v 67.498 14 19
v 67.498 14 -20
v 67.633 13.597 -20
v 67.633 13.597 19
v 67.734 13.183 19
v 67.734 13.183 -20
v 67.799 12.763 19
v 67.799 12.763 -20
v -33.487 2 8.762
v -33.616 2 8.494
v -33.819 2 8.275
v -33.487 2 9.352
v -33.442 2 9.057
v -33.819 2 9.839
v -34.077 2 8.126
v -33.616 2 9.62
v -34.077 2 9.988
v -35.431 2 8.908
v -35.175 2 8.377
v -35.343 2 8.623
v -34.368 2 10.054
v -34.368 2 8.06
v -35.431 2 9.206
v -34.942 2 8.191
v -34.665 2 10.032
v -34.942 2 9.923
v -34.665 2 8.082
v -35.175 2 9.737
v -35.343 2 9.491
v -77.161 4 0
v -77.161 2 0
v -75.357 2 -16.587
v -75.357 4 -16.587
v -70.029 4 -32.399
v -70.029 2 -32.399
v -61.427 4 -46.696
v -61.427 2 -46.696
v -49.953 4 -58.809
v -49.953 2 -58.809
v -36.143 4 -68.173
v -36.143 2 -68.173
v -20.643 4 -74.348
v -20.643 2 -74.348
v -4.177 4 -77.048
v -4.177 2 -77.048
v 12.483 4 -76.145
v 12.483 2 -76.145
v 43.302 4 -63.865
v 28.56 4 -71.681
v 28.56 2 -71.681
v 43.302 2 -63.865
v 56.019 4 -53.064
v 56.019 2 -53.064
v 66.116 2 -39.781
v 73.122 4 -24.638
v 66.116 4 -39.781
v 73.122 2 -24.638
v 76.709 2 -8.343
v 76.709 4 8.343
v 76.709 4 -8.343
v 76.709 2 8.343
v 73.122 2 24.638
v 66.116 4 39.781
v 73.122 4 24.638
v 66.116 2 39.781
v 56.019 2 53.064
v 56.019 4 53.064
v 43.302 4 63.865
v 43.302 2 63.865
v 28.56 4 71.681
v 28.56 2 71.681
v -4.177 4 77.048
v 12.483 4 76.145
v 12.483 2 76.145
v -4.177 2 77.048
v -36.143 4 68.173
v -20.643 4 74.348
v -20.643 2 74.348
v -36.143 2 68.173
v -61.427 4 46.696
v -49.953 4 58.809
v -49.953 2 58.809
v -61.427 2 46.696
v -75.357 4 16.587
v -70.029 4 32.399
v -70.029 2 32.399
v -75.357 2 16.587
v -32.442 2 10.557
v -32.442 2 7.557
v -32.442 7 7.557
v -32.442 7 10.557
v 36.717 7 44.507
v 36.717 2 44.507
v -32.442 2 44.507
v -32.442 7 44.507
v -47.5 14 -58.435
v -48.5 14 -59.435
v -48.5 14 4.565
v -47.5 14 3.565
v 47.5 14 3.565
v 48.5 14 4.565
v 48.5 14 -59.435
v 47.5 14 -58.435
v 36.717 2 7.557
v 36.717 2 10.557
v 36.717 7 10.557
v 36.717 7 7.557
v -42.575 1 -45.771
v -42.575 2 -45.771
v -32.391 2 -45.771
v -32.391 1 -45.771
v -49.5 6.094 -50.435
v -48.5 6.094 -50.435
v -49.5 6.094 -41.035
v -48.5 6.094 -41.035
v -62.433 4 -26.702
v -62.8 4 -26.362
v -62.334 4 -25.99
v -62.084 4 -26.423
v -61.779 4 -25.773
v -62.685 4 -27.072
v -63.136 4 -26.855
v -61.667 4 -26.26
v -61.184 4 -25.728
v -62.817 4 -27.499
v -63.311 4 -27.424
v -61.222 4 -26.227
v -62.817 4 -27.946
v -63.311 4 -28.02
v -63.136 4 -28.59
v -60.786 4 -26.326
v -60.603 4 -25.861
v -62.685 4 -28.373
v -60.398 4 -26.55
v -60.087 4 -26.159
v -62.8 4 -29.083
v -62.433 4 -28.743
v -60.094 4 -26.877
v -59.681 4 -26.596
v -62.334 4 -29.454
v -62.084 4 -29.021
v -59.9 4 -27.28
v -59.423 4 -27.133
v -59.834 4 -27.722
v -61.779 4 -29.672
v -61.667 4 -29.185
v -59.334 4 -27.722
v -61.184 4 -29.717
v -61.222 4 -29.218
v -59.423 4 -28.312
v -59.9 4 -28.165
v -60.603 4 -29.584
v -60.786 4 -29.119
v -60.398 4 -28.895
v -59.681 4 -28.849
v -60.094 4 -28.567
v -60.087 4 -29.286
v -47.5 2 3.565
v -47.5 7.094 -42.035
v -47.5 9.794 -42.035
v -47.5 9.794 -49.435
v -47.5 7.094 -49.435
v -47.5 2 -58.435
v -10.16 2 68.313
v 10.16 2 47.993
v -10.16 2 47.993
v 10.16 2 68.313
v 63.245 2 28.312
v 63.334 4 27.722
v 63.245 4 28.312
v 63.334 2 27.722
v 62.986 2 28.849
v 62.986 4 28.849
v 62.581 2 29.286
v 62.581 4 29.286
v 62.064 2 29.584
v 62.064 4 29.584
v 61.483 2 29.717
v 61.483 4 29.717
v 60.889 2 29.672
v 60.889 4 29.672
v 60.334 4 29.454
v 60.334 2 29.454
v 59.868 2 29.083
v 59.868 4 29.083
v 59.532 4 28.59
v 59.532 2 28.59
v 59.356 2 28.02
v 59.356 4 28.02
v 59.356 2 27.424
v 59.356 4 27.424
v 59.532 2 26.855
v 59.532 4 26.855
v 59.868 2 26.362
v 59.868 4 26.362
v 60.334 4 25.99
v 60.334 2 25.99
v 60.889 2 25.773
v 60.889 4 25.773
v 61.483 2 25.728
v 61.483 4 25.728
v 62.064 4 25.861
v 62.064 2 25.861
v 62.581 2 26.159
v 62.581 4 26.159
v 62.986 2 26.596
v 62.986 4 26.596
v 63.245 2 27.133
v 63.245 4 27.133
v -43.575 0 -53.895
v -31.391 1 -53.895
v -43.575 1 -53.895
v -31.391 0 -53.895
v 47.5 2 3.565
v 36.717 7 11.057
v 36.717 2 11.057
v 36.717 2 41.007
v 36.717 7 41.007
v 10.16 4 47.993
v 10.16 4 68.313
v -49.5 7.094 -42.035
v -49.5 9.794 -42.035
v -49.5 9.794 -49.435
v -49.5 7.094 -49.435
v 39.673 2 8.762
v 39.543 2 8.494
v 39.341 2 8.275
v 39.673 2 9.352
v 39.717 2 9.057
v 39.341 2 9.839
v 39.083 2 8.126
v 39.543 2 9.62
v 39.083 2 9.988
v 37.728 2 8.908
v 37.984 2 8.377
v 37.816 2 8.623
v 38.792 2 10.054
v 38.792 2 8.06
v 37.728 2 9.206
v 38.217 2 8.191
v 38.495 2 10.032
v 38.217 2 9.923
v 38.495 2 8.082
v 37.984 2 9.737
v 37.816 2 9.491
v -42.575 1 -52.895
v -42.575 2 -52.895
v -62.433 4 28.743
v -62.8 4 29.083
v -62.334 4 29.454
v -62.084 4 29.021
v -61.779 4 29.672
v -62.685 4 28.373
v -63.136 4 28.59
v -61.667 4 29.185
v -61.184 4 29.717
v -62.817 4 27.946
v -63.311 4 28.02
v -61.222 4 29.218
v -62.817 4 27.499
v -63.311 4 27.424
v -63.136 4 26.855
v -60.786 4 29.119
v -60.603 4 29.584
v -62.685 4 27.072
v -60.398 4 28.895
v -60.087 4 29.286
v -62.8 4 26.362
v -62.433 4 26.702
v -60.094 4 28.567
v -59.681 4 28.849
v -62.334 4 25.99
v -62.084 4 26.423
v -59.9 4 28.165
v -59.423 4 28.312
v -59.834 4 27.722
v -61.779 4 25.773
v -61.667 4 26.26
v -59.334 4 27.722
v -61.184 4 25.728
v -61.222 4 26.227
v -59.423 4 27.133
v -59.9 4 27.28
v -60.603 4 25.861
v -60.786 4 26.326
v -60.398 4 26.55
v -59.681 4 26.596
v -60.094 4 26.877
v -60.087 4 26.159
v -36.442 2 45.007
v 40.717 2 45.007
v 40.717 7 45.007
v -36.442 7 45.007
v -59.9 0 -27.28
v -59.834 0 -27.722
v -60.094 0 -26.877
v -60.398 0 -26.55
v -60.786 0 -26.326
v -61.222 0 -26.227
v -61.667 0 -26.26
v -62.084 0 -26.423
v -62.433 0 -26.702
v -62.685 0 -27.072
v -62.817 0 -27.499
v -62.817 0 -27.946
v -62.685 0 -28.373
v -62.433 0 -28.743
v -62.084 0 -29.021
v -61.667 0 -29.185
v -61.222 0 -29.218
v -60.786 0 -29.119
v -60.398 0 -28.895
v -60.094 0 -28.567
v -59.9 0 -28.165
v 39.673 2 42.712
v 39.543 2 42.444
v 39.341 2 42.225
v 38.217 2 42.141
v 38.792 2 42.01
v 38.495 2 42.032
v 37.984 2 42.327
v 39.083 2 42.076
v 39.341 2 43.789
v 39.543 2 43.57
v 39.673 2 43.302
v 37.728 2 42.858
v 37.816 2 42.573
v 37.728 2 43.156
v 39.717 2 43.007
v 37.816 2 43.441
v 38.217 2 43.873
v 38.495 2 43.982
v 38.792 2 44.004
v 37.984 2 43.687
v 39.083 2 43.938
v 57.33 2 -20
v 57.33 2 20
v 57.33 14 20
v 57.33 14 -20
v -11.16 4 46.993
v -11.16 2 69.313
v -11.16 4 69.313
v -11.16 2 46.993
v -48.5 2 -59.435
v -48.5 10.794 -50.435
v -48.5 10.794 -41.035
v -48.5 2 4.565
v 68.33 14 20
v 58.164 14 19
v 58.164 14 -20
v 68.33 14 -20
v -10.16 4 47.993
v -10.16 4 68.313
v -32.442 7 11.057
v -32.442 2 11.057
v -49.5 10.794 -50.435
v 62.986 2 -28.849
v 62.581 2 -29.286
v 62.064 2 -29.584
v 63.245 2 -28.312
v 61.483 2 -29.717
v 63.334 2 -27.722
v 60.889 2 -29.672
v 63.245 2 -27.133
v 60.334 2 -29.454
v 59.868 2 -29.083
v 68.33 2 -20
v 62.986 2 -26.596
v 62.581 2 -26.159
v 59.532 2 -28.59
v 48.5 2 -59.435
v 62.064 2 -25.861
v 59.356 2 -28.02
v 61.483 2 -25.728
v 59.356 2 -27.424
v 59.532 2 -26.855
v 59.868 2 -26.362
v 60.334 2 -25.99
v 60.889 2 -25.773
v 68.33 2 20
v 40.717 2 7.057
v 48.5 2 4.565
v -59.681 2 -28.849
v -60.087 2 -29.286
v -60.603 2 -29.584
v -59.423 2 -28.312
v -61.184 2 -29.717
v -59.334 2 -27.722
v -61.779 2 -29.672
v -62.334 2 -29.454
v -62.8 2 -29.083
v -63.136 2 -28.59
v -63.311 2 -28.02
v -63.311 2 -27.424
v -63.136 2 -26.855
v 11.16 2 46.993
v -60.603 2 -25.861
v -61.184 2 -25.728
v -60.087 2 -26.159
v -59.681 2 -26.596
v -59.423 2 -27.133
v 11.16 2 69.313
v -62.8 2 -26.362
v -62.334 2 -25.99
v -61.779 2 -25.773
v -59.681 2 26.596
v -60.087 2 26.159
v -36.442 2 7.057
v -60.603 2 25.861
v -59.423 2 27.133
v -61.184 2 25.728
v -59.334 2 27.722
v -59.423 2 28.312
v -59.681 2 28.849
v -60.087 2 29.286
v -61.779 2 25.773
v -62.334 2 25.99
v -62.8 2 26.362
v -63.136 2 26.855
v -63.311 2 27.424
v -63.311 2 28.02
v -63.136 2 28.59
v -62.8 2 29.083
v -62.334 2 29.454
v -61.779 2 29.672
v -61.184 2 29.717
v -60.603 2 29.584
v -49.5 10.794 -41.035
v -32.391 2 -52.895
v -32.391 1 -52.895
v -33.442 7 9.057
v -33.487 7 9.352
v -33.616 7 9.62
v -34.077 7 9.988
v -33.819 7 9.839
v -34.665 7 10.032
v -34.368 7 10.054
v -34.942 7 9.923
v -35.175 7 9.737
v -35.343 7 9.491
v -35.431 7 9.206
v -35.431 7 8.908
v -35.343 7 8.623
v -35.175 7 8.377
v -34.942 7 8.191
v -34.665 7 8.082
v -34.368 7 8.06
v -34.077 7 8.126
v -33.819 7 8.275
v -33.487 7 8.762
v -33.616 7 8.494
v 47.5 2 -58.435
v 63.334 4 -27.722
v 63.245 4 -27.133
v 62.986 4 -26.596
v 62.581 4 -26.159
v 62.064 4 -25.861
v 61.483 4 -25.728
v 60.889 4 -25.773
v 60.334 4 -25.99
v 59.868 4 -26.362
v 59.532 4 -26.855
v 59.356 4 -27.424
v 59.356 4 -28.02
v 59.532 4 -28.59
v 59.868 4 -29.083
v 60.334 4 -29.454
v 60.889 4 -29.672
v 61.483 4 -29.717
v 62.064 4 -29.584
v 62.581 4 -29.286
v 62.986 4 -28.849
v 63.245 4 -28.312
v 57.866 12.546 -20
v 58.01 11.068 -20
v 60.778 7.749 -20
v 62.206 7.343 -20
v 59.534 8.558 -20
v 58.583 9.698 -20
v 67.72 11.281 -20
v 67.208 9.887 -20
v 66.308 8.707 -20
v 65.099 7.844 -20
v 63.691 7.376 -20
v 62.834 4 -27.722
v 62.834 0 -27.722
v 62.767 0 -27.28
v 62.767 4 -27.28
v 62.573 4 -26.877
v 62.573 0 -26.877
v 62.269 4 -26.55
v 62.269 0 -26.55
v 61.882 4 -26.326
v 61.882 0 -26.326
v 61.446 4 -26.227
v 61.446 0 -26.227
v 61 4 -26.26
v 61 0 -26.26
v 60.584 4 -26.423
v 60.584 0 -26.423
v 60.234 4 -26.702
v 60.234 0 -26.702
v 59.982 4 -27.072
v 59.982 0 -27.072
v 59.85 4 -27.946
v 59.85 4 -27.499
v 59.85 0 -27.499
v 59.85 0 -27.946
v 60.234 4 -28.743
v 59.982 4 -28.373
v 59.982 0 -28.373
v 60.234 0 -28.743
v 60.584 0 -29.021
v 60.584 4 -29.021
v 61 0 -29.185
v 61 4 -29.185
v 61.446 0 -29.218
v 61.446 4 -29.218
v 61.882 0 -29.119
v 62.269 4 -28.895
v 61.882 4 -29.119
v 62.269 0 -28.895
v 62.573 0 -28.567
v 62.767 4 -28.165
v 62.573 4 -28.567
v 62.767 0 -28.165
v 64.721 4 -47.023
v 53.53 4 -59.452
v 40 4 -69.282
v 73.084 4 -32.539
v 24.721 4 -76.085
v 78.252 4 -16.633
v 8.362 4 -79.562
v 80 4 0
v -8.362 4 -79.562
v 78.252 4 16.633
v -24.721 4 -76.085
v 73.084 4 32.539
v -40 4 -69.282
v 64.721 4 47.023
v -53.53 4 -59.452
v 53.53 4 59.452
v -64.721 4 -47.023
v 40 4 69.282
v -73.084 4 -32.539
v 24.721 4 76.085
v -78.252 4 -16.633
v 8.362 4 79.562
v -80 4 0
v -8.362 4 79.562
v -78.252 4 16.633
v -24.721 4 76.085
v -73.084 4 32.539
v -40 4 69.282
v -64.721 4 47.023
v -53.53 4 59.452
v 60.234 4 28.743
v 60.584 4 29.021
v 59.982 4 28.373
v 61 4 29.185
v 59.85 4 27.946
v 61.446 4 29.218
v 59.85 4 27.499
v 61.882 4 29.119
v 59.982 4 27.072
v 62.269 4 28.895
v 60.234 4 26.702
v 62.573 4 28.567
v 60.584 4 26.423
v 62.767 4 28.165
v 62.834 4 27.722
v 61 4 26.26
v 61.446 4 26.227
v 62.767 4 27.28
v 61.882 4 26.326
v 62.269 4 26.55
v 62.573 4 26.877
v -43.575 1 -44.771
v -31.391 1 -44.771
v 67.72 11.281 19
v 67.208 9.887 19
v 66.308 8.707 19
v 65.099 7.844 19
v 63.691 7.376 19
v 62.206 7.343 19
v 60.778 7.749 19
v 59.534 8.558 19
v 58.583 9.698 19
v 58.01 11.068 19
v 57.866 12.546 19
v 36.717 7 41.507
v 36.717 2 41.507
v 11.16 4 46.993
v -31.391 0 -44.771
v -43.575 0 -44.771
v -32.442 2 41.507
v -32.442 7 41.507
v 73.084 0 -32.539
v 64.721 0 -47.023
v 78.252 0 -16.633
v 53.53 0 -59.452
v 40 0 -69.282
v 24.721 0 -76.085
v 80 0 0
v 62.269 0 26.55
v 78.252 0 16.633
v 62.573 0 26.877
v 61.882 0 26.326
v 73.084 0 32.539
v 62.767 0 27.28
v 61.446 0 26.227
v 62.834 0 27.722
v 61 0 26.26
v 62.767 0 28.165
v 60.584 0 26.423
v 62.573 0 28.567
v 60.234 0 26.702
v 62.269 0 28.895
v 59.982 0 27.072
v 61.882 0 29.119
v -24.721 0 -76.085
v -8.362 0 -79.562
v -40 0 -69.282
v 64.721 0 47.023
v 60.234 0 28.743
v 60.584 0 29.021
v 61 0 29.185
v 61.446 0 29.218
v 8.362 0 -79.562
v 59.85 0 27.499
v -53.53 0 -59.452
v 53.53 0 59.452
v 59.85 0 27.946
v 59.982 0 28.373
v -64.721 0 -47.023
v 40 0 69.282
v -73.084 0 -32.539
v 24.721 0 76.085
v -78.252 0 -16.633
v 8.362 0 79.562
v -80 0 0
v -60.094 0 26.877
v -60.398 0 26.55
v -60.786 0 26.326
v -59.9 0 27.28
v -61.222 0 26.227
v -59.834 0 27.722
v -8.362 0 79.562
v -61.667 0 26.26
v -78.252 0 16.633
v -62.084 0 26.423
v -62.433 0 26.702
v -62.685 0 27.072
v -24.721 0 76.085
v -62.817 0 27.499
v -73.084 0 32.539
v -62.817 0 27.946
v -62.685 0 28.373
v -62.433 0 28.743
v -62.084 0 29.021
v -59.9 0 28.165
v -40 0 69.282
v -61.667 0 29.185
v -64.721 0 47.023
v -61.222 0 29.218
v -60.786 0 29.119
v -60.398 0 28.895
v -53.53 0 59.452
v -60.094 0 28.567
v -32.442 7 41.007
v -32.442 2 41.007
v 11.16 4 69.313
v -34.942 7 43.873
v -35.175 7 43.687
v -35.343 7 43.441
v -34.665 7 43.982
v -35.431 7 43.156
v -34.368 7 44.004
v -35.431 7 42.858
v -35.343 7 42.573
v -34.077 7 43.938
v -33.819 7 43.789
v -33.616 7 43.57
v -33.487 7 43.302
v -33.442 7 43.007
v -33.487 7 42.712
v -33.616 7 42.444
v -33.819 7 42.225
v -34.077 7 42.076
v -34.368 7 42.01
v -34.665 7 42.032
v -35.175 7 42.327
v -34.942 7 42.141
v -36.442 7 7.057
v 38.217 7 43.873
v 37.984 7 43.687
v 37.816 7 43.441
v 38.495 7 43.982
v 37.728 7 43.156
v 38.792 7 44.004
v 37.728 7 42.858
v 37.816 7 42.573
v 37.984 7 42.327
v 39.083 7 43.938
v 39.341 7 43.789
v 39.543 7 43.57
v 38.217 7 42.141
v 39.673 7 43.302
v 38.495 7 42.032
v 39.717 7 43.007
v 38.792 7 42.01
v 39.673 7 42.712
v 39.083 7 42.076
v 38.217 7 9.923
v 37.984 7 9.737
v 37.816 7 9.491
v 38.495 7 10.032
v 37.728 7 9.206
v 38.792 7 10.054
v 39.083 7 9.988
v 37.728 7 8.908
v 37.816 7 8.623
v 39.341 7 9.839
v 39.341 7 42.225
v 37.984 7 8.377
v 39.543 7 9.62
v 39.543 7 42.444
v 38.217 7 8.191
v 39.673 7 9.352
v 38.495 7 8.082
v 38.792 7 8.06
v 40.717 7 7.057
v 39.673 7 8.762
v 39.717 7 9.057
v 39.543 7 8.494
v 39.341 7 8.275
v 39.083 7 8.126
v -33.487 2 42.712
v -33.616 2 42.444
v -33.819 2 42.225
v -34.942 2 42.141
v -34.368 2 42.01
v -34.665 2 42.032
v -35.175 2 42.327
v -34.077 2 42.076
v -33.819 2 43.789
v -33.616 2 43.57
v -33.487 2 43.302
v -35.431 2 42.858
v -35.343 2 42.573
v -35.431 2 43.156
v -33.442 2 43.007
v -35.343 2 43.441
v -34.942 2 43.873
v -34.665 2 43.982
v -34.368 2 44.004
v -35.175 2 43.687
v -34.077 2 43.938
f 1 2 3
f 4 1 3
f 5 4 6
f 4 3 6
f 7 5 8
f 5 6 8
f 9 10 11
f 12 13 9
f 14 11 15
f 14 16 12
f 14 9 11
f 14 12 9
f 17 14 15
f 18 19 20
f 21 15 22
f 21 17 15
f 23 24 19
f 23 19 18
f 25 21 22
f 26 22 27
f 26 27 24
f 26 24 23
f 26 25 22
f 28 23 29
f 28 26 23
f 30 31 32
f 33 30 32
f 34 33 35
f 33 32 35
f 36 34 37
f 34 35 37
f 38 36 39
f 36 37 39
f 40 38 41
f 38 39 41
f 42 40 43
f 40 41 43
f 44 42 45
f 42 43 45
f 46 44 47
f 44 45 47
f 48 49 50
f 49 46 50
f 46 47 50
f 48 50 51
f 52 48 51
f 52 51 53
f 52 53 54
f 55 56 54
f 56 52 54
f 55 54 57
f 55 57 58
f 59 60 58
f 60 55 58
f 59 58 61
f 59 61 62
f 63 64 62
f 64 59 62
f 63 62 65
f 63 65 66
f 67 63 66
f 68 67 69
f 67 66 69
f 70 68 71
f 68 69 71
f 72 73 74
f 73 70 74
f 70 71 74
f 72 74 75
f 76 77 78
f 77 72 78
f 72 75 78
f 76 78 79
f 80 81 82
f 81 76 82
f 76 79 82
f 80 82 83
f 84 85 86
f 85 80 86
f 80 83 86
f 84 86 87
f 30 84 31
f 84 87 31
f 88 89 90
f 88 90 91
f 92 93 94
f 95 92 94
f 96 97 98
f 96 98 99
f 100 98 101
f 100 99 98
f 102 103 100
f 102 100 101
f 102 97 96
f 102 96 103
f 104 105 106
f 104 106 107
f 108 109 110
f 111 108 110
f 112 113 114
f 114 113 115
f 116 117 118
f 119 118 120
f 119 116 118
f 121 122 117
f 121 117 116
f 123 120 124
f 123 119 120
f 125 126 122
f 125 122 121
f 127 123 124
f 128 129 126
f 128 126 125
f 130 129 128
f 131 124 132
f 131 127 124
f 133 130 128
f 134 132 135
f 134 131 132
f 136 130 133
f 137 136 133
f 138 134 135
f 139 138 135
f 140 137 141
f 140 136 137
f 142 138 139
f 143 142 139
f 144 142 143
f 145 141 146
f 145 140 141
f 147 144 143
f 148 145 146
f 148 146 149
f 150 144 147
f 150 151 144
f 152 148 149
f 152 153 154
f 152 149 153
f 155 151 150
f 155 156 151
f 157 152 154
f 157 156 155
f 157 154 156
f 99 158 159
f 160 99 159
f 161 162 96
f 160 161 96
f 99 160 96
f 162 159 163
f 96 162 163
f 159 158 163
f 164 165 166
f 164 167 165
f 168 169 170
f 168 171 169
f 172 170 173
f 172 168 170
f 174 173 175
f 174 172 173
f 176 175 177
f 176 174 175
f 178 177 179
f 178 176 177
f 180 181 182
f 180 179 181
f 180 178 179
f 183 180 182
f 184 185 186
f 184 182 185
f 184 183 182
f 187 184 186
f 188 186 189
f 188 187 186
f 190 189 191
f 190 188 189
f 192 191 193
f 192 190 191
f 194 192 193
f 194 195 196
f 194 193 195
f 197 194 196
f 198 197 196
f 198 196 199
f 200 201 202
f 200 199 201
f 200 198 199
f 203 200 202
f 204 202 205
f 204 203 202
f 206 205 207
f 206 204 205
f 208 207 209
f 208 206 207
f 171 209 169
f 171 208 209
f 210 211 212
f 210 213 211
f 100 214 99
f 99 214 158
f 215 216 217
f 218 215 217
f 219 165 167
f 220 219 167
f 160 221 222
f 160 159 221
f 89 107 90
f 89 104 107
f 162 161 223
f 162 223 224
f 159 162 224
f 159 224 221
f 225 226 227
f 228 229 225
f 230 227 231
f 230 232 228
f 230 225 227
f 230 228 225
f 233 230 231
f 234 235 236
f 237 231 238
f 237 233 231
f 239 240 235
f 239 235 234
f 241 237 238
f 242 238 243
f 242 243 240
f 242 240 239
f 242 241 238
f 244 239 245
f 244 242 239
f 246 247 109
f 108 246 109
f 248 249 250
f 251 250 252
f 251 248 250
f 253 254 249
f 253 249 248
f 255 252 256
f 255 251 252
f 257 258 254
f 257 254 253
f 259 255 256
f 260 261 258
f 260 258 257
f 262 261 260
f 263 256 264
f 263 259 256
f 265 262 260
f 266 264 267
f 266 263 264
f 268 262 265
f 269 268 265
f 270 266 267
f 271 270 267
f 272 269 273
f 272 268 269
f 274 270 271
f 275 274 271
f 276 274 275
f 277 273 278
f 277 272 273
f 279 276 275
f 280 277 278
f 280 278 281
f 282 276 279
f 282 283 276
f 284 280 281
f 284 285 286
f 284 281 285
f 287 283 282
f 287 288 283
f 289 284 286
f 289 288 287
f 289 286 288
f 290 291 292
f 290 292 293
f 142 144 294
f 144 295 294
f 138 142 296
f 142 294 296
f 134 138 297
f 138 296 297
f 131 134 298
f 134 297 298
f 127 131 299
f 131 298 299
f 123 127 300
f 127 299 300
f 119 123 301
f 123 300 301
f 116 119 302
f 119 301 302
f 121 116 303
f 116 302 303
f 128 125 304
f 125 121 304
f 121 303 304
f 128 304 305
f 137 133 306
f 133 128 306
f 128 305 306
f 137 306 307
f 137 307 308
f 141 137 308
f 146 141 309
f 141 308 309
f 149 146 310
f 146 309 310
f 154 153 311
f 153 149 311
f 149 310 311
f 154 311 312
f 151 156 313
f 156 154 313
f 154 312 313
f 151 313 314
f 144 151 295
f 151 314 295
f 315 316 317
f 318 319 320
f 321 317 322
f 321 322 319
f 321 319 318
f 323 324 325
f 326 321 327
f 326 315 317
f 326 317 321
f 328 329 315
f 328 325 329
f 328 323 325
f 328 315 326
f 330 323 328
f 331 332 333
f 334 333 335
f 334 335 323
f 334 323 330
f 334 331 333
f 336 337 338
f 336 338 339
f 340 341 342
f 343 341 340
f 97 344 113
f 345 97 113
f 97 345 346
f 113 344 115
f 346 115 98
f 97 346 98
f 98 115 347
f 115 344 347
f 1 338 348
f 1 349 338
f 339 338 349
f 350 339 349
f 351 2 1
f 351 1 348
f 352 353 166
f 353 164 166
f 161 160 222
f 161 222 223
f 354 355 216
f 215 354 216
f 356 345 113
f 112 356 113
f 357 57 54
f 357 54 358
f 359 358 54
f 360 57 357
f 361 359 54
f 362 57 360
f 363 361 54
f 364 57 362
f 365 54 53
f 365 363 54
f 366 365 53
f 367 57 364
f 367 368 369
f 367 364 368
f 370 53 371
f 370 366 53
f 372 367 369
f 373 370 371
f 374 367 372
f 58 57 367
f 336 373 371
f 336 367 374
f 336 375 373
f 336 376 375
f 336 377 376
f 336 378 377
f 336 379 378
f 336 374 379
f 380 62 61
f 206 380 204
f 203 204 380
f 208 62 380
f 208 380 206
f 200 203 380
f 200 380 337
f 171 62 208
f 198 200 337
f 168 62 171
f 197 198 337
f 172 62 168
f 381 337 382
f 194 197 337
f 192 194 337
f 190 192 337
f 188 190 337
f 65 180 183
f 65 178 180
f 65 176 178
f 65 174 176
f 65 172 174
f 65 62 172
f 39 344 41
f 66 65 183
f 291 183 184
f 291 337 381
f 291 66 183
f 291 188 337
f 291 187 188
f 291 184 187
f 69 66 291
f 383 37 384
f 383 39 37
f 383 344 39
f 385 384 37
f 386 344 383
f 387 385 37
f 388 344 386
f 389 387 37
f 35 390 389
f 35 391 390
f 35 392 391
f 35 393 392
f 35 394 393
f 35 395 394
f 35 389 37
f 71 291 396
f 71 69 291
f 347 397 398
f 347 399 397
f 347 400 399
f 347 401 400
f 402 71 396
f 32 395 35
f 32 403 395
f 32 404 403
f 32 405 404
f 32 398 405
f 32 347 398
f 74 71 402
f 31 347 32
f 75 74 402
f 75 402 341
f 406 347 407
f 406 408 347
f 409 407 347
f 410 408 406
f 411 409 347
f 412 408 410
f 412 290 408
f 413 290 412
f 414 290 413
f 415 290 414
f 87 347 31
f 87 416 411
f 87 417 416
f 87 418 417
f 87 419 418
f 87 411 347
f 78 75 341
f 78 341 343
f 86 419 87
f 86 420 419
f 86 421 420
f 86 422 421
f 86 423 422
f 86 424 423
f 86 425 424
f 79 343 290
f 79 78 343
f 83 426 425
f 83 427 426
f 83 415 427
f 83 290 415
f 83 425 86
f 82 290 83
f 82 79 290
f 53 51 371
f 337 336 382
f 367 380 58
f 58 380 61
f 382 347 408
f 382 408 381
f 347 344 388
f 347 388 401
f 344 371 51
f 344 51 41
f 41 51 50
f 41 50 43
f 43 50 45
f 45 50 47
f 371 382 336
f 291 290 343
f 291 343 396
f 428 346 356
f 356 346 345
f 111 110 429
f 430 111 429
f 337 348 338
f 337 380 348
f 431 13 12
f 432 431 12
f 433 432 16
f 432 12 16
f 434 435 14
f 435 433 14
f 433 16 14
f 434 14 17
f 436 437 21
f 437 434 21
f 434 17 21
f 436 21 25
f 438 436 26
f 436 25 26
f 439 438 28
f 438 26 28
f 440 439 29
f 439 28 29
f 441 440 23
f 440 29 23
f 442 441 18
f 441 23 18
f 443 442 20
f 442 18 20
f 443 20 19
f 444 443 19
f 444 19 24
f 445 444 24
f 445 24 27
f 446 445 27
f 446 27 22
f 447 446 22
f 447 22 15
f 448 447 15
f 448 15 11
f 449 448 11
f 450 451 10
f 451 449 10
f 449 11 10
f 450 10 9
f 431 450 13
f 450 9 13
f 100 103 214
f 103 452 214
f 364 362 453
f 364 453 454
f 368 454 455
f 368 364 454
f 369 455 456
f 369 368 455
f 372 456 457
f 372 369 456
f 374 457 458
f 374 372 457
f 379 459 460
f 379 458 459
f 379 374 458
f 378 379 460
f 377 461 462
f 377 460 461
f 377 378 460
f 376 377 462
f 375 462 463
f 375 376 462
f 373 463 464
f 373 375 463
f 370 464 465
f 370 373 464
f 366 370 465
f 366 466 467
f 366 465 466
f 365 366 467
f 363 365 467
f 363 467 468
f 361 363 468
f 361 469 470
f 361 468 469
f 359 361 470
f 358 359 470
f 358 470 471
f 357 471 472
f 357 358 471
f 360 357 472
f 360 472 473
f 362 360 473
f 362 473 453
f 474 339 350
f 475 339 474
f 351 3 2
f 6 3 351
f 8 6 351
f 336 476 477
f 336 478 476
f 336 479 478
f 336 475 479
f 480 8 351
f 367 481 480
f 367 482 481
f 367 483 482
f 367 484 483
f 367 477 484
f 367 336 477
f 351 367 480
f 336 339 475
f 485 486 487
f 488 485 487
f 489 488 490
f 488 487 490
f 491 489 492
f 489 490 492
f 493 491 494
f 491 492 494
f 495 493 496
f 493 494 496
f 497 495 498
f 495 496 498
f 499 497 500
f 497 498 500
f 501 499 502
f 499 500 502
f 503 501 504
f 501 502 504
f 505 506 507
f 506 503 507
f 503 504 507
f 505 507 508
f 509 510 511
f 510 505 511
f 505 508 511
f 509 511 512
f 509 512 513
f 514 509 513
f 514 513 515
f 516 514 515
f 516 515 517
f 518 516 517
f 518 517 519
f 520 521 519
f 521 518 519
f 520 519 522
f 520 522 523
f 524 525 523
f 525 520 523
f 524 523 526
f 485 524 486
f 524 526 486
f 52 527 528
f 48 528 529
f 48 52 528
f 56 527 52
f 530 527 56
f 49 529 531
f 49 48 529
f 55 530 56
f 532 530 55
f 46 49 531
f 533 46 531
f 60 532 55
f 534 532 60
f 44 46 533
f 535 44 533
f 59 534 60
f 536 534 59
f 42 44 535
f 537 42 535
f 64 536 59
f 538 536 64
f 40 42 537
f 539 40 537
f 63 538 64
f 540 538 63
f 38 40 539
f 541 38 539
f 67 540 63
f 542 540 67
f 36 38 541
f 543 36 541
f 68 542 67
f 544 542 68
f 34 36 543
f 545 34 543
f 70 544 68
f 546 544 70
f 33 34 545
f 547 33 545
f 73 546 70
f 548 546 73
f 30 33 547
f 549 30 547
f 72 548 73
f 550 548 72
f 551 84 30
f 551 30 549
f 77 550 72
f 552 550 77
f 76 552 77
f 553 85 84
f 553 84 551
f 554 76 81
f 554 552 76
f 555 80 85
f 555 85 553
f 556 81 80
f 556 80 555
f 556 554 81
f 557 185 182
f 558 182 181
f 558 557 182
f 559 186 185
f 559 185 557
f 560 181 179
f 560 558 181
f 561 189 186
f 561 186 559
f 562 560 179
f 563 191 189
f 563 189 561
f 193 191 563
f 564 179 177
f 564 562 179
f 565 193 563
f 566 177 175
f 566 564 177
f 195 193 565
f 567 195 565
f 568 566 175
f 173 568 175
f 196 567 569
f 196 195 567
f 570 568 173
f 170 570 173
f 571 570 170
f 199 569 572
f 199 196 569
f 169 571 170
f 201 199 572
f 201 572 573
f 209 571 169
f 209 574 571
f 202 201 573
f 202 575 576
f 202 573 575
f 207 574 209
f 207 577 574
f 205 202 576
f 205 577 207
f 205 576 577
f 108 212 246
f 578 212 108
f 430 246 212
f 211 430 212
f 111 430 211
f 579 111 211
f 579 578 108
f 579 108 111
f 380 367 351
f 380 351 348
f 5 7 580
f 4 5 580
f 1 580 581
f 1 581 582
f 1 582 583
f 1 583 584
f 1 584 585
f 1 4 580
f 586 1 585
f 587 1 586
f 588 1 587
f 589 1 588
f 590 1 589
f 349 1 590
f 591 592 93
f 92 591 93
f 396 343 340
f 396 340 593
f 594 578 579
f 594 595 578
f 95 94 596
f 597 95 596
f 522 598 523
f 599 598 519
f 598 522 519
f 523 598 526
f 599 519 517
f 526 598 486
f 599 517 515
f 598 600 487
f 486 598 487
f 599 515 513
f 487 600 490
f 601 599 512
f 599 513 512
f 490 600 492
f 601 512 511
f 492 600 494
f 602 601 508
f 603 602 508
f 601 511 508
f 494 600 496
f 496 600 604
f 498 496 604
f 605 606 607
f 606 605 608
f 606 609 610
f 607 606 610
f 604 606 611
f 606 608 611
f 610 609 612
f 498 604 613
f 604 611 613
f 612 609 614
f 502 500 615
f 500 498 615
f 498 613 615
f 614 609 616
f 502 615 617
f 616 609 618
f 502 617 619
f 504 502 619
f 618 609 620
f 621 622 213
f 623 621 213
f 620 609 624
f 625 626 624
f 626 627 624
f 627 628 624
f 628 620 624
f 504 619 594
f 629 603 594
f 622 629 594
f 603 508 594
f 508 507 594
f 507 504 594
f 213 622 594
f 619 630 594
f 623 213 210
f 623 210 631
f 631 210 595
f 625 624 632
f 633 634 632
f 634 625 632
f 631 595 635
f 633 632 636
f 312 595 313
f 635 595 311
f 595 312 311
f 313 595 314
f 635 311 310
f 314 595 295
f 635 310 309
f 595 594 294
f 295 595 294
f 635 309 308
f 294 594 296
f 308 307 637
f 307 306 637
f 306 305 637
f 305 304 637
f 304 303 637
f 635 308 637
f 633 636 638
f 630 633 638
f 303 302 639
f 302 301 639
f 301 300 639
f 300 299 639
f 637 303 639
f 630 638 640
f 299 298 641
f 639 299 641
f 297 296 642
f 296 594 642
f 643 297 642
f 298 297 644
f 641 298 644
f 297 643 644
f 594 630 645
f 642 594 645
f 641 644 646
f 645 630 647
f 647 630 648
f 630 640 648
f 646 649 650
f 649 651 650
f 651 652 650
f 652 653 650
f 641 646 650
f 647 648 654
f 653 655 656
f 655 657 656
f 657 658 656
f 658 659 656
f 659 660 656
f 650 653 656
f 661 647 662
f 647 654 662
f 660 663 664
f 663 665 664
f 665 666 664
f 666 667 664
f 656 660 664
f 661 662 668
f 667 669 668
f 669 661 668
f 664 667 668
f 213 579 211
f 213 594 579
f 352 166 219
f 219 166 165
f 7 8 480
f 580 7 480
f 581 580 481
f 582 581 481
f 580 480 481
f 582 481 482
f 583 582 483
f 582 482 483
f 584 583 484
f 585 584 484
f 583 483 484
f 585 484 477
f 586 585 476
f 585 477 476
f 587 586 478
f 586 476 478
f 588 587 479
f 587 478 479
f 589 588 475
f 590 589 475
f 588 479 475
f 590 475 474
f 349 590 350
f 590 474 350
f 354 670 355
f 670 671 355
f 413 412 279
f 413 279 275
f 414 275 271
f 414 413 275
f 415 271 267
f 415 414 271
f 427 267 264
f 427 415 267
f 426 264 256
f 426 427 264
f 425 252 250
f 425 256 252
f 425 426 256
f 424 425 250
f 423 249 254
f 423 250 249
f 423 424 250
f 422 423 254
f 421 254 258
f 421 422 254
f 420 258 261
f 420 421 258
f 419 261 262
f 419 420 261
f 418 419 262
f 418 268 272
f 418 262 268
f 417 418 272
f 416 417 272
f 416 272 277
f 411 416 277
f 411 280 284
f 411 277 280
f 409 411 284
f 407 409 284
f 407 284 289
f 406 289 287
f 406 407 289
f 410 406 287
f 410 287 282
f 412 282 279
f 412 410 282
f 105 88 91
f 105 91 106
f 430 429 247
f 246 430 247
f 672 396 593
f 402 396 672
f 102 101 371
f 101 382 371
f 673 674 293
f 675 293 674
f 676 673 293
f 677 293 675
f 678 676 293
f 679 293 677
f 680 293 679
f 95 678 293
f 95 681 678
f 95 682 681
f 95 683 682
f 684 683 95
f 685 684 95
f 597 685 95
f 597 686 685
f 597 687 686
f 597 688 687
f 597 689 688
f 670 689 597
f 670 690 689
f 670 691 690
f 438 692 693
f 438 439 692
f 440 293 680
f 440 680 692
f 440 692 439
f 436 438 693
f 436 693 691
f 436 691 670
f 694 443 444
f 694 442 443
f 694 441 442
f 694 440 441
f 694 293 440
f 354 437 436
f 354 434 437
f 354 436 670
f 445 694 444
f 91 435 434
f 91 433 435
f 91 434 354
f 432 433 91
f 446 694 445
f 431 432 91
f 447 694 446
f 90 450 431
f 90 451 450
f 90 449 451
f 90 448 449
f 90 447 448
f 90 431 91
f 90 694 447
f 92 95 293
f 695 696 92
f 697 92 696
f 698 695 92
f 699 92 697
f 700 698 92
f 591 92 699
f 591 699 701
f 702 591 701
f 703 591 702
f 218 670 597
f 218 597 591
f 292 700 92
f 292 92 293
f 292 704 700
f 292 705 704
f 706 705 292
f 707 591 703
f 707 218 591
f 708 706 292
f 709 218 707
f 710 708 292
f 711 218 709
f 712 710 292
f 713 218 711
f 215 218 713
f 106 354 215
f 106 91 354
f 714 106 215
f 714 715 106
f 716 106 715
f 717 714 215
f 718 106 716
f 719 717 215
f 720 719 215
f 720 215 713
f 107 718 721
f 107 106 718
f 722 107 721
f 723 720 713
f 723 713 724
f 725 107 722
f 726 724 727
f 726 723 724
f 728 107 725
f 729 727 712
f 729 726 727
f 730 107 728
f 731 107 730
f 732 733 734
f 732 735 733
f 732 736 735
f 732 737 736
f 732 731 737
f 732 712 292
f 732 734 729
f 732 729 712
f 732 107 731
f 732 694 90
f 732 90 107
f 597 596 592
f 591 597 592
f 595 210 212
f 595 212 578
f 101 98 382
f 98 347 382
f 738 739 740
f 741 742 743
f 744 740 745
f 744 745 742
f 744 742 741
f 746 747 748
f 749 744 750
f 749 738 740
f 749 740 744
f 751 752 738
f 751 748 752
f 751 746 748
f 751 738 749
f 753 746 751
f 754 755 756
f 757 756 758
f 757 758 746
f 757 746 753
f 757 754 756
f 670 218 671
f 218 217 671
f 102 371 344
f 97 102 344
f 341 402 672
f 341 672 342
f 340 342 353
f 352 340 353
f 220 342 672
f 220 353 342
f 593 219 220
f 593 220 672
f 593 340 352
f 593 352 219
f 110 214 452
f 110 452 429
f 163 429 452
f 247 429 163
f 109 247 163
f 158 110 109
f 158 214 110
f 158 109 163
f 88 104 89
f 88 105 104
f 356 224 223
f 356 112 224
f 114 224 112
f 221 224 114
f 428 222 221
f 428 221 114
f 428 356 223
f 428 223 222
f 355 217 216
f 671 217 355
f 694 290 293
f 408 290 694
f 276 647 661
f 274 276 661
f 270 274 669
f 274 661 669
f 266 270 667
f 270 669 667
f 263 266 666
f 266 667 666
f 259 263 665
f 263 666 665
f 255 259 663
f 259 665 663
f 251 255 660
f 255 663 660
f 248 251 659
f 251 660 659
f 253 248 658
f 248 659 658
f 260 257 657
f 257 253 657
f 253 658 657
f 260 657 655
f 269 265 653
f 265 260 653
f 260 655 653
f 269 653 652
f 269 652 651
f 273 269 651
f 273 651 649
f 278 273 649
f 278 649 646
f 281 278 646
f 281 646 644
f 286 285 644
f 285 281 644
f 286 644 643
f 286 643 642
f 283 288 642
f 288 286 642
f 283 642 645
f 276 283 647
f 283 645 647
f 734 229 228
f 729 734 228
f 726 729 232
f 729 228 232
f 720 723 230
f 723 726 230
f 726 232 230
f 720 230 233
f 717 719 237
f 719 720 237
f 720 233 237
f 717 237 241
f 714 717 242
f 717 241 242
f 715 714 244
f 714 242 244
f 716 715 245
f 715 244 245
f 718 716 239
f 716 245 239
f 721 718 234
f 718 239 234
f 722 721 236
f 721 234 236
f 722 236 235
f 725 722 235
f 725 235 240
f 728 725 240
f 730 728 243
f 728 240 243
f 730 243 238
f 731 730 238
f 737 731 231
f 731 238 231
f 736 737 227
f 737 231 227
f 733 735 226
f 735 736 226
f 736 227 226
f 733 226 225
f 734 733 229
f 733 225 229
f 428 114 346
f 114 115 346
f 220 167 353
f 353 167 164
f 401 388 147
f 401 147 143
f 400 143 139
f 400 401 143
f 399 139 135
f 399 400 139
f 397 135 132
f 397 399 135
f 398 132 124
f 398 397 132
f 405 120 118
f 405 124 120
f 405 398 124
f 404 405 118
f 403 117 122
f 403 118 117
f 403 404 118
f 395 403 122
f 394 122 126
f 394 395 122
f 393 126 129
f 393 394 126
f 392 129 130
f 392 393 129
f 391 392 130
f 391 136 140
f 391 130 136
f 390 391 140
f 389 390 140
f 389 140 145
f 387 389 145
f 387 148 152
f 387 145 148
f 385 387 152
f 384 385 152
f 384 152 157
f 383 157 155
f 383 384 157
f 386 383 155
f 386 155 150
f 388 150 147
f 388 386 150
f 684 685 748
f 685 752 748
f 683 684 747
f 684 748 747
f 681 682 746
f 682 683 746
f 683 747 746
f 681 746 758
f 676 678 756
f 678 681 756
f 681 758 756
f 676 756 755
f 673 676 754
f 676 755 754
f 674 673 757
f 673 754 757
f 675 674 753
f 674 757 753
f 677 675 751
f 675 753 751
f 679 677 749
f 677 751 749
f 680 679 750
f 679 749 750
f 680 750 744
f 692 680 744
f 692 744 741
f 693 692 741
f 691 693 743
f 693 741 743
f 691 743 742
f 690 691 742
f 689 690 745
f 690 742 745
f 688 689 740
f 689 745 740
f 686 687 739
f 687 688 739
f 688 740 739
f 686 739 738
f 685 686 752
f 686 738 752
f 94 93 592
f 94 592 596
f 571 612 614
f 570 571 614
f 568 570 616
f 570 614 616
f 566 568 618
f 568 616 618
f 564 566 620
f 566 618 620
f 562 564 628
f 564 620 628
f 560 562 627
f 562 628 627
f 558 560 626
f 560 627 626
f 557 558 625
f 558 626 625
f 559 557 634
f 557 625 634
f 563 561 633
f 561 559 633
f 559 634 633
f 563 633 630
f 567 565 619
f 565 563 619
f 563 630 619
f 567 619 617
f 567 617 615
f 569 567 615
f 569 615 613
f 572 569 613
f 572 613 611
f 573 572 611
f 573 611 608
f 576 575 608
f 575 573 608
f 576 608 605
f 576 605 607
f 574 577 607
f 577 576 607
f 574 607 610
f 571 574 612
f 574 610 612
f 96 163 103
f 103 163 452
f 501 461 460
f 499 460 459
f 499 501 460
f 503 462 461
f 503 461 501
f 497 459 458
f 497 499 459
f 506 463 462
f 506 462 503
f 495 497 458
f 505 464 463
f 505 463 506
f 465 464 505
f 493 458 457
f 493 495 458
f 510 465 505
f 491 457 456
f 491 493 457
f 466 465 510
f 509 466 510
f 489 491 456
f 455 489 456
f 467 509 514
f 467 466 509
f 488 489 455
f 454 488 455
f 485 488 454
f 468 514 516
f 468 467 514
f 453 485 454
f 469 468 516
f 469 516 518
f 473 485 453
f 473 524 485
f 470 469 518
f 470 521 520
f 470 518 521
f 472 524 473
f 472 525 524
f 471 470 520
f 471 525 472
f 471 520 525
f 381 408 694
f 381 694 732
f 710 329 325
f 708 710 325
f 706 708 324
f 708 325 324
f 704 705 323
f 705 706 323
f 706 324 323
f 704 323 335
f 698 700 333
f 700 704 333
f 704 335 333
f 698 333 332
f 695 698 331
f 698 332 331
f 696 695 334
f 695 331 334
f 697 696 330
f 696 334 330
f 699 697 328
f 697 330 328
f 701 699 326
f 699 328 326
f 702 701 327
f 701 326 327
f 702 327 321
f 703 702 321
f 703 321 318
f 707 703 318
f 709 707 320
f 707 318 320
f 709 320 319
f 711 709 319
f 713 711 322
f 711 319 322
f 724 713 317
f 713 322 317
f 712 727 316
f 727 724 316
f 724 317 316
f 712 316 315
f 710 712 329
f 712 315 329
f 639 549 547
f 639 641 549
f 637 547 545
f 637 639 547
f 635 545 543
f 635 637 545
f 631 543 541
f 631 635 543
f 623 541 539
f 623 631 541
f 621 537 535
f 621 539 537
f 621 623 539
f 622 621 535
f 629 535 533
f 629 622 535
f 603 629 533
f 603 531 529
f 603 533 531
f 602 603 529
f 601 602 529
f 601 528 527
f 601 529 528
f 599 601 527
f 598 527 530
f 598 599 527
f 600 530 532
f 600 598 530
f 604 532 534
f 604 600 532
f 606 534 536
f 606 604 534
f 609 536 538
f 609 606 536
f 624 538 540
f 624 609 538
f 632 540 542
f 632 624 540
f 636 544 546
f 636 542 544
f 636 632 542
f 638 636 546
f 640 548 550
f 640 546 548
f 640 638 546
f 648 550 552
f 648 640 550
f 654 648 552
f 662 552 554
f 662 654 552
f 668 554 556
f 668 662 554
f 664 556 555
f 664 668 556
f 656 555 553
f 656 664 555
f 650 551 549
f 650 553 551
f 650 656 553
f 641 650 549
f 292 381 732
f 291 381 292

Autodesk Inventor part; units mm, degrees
ref_plane "YZ Plane" through (0, 0, 0) normal (1, 0, 0) x (0, 1, 0)
ref_plane "XZ Plane" through (0, 0, 0) normal (0, 1, 0) x (-1, 0, 0)
ref_plane "XY Plane" through (0, 0, 0) normal (0, 0, 1) x (1, 0, 0)
sketch "Boceto1" plane through (0, 0, 0) normal (0, 1, 0) x (-1, 0, 0)
  circle A0 centre (0, 0) radius 80
  circle A1 centre (0, 0) radius 77.161
  dimension "d0" = 160
  dimension "d6" = 2.839
extrude "Extrusión3" add sketch "Boceto1" along normal blind 4
extrude "Extrusión4" add sketch "Boceto1" along normal blind 2 contours A1
sketch "Boceto2" plane through (0, 2, 0) normal (0, 1, 0) x (1, 0, 0)
  line L0 (47.5, -3.5651) -> (-47.5, -3.5651)
  line L1 (-47.5, -3.5651) -> (-47.5, 58.4349)
  line L2 (-47.5, 58.4349) -> (47.5, 58.4349)
  line L3 (47.5, 58.4349) -> (47.5, -3.5651)
  line L4 (47.5, -44.1835) -> (-47.5, 44.1835) construction
  line L5 (-47.5, -44.1835) -> (47.5, 44.1835) construction
  line L6 (-48.5, -4.5651) -> (48.5, -4.5651)
  line L7 (48.5, -4.5651) -> (48.5, 59.4349)
  line L8 (48.5, 59.4349) -> (-48.5, 59.4349)
  line L9 (-48.5, 59.4349) -> (-48.5, -4.5651)
  line L10 (-48.5, -9.337) -> (48.5, 54.663) construction
  line L11 (48.5, -45.1835) -> (-48.5, 45.1835) construction
  line L12 (-32.3907, 52.8953) -> (-42.5753, 52.8953)
  line L13 (-42.5753, 52.8953) -> (-42.5753, 45.7711)
  line L14 (-42.5753, 45.7711) -> (-32.3907, 45.7711)
  line L15 (-32.3907, 45.7711) -> (-32.3907, 52.8953)
  point P0 (0, 0)
  dimension "d11" = 95
  dimension "d12" = 62
  dimension "d16" = 1
  dimension "d17" = 1
extrude "Extrusión5" add sketch "Boceto2" along normal blind 12 contours L9 L8 L7 L6
sketch "Boceto4" plane through (-48.5, 2, -59.4349) normal (-1, 0, 0) x (0, 0, 1)
  line L0 (0, 0) -> (0, 12) projected
  line L1 (0, 12) -> (0, 1.9732)
  line L2 (10, 5.0938) -> (17.4, 5.0938)
  line L3 (17.4, 5.0938) -> (17.4, 7.7938)
  line L4 (17.4, 7.7938) -> (10, 7.7938)
  line L5 (10, 7.7938) -> (10, 5.0938)
  line L6 (10, 5.0938) -> (17.4, 7.7938) construction
  line L7 (17.4, 5.0938) -> (10, 7.7938) construction
  line L8 (9, 4.0938) -> (18.4, 4.0938)
  line L9 (18.4, 4.0938) -> (18.4, 8.7938)
  line L10 (18.4, 8.7938) -> (9, 8.7938)
  line L11 (9, 8.7938) -> (9, 4.0938)
  line L12 (9, 4.0938) -> (18.4, 8.7938) construction
  line L13 (18.4, 4.0938) -> (9, 8.7938) construction
  point P0 (59.4349, -2)
  point P1 (13.7, 6.4438)
  dimension "d22" = 7.4
  dimension "d23" = 2.7
  dimension "d24" = 1
  dimension "d25" = 1
extrude "Extrusión6" cut sketch "Boceto4" against normal blind 14 contours L5 L4 L3 L2
extrude "Extrusión7" add sketch "Boceto4" along normal blind 1
sketch "Boceto6" plane through (0, 2, 0) normal (0, 1, 0) x (1, 0, 0)
  line L0 (-32.4424, -11.0569) -> (36.7172, -11.0569)
  line L1 (36.7172, -11.0569) -> (36.7172, -41.0069)
  line L2 (36.7172, -41.0069) -> (-32.4424, -41.0069)
  line L3 (-32.4424, -41.0069) -> (-32.4424, -11.0569)
  line L4 (-36.4424, -7.0569) -> (40.7172, -7.0569)
  line L5 (40.7172, -7.0569) -> (40.7172, -45.0069)
  line L6 (40.7172, -45.0069) -> (-36.4424, -45.0069)
  line L7 (-36.4424, -45.0069) -> (-36.4424, -7.0569)
  line L8 (36.7172, -7.5569) -> (-32.4424, -7.5569)
  line L9 (-32.4424, -7.5569) -> (-32.4424, -10.5569)
  line L10 (-32.4424, -10.5569) -> (36.7172, -10.5569)
  line L11 (36.7172, -10.5569) -> (36.7172, -7.5569)
  line L12 (36.7172, -44.5069) -> (-32.4424, -44.5069)
  line L13 (-32.4424, -44.5069) -> (-32.4424, -41.5069)
  line L14 (-32.4424, -41.5069) -> (36.7172, -41.5069)
  line L15 (36.7172, -41.5069) -> (36.7172, -44.5069)
  circle A0 centre (38.7172, -9.0569) radius 1
  circle A1 centre (38.7172, -43.0069) radius 1
  circle A2 centre (-34.4424, -9.0569) radius 1
  circle A3 centre (-34.4424, -43.0069) radius 1
  point P0 (0, 0)
  dimension "d32" = 4
  dimension "d41" = 3
  dimension "d42" = 0.5
  dimension "d43" = 2
sketch "Boceto7" plane through (0, 2, 0) normal (0, 1, 0) x (1, 0, 0)
  line L0 (-10.16, -47.9931) -> (10.16, -47.9931)
  line L1 (10.16, -47.9931) -> (10.16, -68.3131)
  line L2 (10.16, -68.3131) -> (-10.16, -68.3131)
  line L3 (-10.16, -68.3131) -> (-10.16, -47.9931)
  line L4 (-10.16, -47.9931) -> (10.16, -68.3131) construction
  line L5 (10.16, -47.9931) -> (-10.16, -68.3131) construction
  line L6 (-11.16, -46.9931) -> (11.16, -46.9931)
  line L7 (11.16, -46.9931) -> (11.16, -69.3131)
  line L8 (11.16, -69.3131) -> (-11.16, -69.3131)
  line L9 (-11.16, -69.3131) -> (-11.16, -46.9931)
  line L10 (-11.16, -46.9931) -> (11.16, -69.3131) construction
  line L11 (11.16, -46.9931) -> (-11.16, -69.3131) construction
  point P0 (0, 0)
  point P1 (0, -58.1531)
  dimension "d34" = 20.32
  dimension "d35" = 20.32
  dimension "d36" = 22.32
  dimension "d37" = 22.32
extrude "Extrusión8" add sketch "Boceto7" along normal blind 2
extrude "Extrusión9" add sketch "Boceto6" along normal blind 5
thread "Rosca1" size "M2x0.4" class "6H" standard "ANSI Metric M Profile" full length
thread "Rosca2" size "M2x0.4" class "6H" standard "ANSI Metric M Profile" full length
thread "Rosca3" size "M2x0.4" class "6H" standard "ANSI Metric M Profile" full length
thread "Rosca4" size "M2x0.4" class "6H" standard "ANSI Metric M Profile" full length
extrude "Extrusión10" cut sketch "Boceto2" against normal through all contours L15 L14 L13 L12
sketch "Boceto8" plane through (0, 0, 0) normal (0, -1, 0) x (1, 0, 0)
  line L0 (-42.5753, -52.8953) -> (-32.3907, -52.8953) projected
  line L1 (-32.3907, -52.8953) -> (-32.3907, -45.7711) projected
  line L2 (-31.3907, -53.8953) -> (-43.5753, -53.8953)
  line L3 (-43.5753, -53.8953) -> (-43.5753, -44.7711)
  line L4 (-43.5753, -44.7711) -> (-31.3907, -44.7711)
  line L5 (-31.3907, -44.7711) -> (-31.3907, -53.8953)
  line L6 (-31.3907, -53.8953) -> (-43.5753, -44.7711) construction
  line L7 (-43.5753, -53.8953) -> (-31.3907, -44.7711) construction
  line L8 (-42.5753, -52.8953) -> (-42.5753, -45.7711) projected
  line L9 (-42.5753, -52.8953) -> (-32.3907, -52.8953)
  line L10 (-32.3907, -52.8953) -> (-32.3907, -45.7711)
  line L11 (-32.3907, -45.7711) -> (-42.5753, -45.7711)
  line L12 (-42.5753, -45.7711) -> (-42.5753, -52.8953)
  point P0 (0, 0)
  point P1 (-37.483, -49.3332)
  point P2 (-37.483, -52.8953)
  dimension "d56" = 1
  dimension "d57" = 1
extrude "Extrusión11" cut sketch "Boceto8" against normal blind 1
sketch "Boceto9" plane through (0, 2, 0) normal (0, 1, 0) x (1, 0, 0)
  circle A0 centre (0, 0) radius 77.161 projected
  line L0 (77.161, 0) -> (48.5, 0)
  line L1 (48.5, 59.4349) -> (48.5, -4.5651) projected
  line L2 (57.3305, 20) -> (68.3305, 20)
  line L3 (68.3305, 20) -> (68.3305, -20)
  line L4 (68.3305, -20) -> (57.3305, -20)
  line L5 (57.3305, -20) -> (57.3305, 20)
  line L6 (57.3305, 20) -> (68.3305, -20) construction
  line L7 (68.3305, 20) -> (57.3305, -20) construction
  point P0 (62.8305, 0)
  dimension "d60" = 11
  dimension "d61" = 40
extrude "Extrusión12" add sketch "Boceto9" along normal blind 12 contours L3 L4 L5 L0 | L0 L5 L2 L3
sketch "Boceto11" plane through (57.3305, 2, 20) normal (0, 0, 1) x (1, 0, 0)
  line L0 (11, 0) -> (0, 0) projected
  line L1 (0, 0) -> (0, 1)
  line L2 (0, 0) -> (0, 12) projected
  line L3 (0, 1) -> (11, 1)
  line L4 (11, 0) -> (11, 12) projected
  line L5 (0, 12) -> (11, 12) projected
  line L6 (0, 12) -> (0.5, 12)
  line L7 (11, 12) -> (10.5, 12)
  line L8 (10.167, 12) -> (0.833, 12)
  line L9 (0, 0) -> (11, 0) projected
  line L10 (0, 0) -> (0, 12) projected
  line L11 (11, 12) -> (0, 12) projected
  line L12 (11, 0) -> (11, 12) projected
  point P0 (-57.3305, -2)
  dimension "d64" = 1
sketch "Boceto12" plane through (68.3305, 2, -20) normal (0, 0, -1) x (-1, 0, 0)
  arc A0 (0.833, 12) -> (10.167, 12) centre (5.5, 10.2059) ccw projected
  arc A1 (0.5311, 10.7631) -> (10.167, 12) centre (5.4899, 10.2844) ccw
  line L0 (0.833, 12) -> (10.167, 12)
  line L1 (11, 0) -> (11, 12) projected
  point P0 (68.3305, -2)
extrude "Extrusión14" cut sketch "Boceto12" against normal blind 39 contours L0 A1 A0
sketch "Boceto13" plane through (0, 2, 0) normal (0, 1, 0) x (1, 0, 0)
  circle A0 centre (-61.3337, 27.7224) radius 1.5
  circle A1 centre (0, 0) radius 77.161 projected
  circle A2 centre (-61.3337, 27.7224) radius 2
  circle A3 centre (-61.3337, -27.7224) radius 1.5
  circle A4 centre (-61.3337, -27.7224) radius 2
  circle A5 centre (61.3337, 27.7224) radius 1.5
  circle A6 centre (61.3337, 27.7224) radius 2
  circle A7 centre (61.3337, -27.7224) radius 2
  circle A8 centre (61.3337, -27.7224) radius 1.5
  line L0 (-61.3337, -27.7224) -> (0, -27.7224)
  line L1 (0, -27.7224) -> (0, 0)
  dimension "d72" = 3
  dimension "d73" = 4
  dimension "d78" = 27.7224
  dimension "d79" = 61.3337
extrude "Extrusión15" add sketch "Boceto13" along normal blind 2 contours A2 | A4 | A6 | A7
extrude "Extrusión16" cut sketch "Boceto13" against normal blind 2 contours A0 | A3 | A5 | A8
properties part number "base"
